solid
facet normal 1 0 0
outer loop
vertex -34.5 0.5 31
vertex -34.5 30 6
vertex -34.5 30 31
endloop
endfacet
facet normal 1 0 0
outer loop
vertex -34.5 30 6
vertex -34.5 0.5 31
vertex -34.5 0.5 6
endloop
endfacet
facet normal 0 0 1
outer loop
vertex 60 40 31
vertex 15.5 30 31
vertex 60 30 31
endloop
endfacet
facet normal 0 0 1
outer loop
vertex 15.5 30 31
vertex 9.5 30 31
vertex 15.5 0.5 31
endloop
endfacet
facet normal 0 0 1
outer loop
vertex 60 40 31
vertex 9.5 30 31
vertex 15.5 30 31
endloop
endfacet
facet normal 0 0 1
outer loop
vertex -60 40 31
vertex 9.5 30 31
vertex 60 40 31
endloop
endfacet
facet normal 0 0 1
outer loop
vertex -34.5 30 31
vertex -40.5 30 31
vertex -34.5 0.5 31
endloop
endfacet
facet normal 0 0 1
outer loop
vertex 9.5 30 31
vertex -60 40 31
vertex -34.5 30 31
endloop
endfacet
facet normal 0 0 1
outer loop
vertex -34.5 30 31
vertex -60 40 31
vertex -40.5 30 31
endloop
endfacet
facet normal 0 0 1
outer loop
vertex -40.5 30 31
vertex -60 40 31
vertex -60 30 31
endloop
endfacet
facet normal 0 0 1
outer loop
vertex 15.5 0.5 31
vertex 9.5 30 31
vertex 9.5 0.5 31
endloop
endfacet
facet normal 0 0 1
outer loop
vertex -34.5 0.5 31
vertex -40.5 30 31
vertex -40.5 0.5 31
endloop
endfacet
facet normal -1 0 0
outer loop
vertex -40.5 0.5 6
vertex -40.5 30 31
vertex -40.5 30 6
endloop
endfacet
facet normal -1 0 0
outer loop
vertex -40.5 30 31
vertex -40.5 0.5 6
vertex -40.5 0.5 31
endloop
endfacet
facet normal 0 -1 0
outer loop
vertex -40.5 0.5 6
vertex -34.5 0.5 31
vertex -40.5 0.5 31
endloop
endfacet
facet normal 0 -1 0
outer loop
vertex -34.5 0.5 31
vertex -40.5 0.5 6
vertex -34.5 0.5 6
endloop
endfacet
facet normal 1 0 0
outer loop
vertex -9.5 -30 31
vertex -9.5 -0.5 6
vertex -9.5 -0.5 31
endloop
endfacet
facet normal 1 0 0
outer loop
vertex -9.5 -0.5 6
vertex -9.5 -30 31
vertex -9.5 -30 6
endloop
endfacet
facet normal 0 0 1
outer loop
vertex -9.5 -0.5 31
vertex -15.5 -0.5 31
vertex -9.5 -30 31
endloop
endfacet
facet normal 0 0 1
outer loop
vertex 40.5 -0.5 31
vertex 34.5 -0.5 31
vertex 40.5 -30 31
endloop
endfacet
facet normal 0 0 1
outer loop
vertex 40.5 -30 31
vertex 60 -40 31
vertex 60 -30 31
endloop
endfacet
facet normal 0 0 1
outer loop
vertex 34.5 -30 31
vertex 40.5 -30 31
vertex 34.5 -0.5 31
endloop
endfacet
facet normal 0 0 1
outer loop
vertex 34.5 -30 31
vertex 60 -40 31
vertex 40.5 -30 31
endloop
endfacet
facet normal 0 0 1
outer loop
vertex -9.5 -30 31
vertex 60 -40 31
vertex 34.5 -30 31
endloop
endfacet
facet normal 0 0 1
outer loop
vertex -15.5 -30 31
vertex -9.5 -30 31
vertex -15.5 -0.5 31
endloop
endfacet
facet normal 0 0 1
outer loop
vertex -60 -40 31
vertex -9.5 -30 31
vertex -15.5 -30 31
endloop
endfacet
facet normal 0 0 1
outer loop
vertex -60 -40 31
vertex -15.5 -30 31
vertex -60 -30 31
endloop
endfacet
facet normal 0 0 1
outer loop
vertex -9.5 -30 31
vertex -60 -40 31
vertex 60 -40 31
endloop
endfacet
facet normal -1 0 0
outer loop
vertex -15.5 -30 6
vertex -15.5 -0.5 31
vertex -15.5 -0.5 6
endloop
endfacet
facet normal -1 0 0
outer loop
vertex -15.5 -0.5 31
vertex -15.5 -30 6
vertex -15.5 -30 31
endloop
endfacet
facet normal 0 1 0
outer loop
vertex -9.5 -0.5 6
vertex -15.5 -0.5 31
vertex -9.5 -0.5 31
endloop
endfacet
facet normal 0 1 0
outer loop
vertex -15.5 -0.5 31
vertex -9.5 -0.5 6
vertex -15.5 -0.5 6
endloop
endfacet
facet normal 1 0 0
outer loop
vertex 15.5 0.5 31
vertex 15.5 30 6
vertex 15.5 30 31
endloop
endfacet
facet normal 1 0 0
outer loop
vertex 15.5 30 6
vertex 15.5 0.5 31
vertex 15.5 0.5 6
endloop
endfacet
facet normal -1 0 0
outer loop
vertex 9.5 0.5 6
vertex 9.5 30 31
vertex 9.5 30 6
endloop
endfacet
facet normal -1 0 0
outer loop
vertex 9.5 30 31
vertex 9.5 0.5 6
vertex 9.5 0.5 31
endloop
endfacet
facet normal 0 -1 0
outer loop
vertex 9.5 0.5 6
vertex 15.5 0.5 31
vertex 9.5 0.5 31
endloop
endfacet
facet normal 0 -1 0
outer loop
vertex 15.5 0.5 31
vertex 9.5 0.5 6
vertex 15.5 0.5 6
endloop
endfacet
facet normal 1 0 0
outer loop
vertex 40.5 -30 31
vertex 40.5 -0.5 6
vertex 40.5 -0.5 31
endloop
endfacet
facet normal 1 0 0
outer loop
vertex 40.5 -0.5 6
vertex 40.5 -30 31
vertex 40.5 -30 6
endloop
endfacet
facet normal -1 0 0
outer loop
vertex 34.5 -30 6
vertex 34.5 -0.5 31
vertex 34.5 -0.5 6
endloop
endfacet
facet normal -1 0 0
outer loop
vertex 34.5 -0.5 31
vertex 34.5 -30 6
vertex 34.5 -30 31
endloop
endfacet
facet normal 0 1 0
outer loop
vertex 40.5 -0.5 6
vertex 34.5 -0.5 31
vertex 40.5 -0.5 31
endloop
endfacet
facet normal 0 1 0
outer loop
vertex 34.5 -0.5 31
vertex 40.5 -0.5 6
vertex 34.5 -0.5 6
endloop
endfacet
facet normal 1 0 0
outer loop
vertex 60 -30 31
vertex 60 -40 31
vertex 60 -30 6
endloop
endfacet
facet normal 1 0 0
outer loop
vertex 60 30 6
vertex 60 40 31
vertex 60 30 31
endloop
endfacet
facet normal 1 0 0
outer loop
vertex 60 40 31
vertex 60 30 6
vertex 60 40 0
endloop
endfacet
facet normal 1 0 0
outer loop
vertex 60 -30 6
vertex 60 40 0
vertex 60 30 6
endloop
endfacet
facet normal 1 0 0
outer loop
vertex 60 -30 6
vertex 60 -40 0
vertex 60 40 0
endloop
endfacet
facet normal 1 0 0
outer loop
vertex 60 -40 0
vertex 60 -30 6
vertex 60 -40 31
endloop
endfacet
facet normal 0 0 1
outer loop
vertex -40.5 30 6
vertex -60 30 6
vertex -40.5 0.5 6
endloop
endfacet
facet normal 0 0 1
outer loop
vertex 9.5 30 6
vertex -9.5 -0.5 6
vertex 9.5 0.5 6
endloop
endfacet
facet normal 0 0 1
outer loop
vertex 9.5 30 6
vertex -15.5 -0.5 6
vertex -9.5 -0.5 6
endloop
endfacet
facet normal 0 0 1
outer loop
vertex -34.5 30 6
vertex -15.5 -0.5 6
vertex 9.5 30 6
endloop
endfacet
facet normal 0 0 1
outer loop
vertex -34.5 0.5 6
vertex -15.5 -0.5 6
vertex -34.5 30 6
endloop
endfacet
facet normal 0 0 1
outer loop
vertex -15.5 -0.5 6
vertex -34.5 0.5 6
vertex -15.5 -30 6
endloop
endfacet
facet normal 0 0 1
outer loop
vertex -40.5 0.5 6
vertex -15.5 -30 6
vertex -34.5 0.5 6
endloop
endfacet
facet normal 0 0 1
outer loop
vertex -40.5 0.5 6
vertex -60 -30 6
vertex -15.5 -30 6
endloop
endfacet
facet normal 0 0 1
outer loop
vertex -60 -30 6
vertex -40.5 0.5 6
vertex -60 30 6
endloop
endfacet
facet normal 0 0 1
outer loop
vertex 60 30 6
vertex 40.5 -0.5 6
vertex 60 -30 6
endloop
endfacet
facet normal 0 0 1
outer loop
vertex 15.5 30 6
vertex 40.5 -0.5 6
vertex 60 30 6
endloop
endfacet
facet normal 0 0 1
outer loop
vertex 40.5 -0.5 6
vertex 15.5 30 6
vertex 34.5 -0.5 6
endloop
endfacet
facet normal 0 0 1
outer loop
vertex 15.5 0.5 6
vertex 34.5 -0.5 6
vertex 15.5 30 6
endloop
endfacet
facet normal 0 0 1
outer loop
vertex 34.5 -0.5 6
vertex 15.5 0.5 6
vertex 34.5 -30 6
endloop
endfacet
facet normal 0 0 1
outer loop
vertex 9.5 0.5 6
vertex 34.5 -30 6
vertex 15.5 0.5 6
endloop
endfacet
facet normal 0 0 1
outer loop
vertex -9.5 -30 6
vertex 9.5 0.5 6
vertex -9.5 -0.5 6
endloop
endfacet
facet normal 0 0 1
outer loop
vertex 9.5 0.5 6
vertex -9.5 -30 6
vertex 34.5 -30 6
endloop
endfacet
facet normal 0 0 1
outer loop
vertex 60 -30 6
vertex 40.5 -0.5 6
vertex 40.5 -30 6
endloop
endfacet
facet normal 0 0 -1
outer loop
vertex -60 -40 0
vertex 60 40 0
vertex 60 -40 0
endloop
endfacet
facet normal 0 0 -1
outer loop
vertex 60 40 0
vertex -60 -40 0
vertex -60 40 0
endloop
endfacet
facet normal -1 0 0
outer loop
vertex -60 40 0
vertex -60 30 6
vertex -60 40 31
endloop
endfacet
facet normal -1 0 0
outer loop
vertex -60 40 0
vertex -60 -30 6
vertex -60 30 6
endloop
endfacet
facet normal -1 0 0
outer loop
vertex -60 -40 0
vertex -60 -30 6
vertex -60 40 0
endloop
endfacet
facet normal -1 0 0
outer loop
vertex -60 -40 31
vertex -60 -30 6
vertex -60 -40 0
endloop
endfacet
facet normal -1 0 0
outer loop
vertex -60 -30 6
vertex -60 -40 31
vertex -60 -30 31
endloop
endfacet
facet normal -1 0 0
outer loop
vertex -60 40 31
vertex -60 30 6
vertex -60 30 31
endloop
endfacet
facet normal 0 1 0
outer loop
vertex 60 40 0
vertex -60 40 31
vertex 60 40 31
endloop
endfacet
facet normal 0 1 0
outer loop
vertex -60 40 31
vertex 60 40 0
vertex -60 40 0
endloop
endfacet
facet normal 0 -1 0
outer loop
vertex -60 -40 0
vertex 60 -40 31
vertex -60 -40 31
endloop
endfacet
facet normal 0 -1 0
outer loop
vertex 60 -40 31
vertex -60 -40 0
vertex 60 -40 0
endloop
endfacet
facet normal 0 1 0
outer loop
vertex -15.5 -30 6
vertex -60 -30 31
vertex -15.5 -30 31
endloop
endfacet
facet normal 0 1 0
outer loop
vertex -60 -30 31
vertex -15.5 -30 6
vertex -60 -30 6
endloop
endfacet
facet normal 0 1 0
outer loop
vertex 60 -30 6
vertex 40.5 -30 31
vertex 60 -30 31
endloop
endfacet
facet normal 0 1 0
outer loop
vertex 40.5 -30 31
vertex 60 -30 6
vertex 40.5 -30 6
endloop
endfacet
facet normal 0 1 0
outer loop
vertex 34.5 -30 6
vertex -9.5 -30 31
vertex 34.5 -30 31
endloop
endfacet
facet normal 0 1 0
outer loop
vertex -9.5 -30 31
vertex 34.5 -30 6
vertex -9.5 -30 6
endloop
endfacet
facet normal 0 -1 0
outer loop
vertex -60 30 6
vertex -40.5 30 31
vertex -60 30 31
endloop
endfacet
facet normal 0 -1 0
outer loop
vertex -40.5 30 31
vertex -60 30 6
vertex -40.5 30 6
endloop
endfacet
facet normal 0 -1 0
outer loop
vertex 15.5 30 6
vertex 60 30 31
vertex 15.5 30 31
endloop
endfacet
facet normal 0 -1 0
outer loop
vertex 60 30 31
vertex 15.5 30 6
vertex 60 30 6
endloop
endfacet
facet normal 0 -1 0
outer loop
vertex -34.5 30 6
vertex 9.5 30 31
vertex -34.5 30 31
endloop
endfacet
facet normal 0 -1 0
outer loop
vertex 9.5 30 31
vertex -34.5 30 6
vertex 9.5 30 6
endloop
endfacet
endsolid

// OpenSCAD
$fn = 32;

// ----------------------------------------------------------------------
// Rib frame 120 x 80 x 31
// 4 ribs at 25 mm pitch, staggered
// ----------------------------------------------------------------------

// --- parameters (mm) ---
frame = [120, 80, 6];  // base plate size (x, y, z)
rail_w = 10;           // side rail width
ribs = 4;              // number of ribs
rib_t = 6;             // rib thickness
rib_h = 25;            // rib height above the base plate
pitch = 25;            // pitch between rib centres

// --- derived feature positions (mm) ---
span = (ribs - 1) * pitch;          // = 75   distance between the outer ribs
origin_x = -span / 2;               // = -37.5   X of the first rib
rib_len = frame[1] / 2 - rail_w + 0.5;  // = 30.5   length of a staggered rib
rib_y = 0.5 + rib_len / 2;          // = 15.75   Y of a staggered rib centre
row_offset = 2 * rib_y;             // = 31.5   distance between the two rows
feature_centers = [
  [origin_x + 0 * pitch, rib_y],
  [origin_x + 1 * pitch, -rib_y],
  [origin_x + 2 * pitch, rib_y],
  [origin_x + 3 * pitch, -rib_y]
];   // rib centre line, drives the rib loop

// base plate, two side rails, then the ribs read straight off feature_centers
union() {
  translate([-frame[0] / 2, -frame[1] / 2, 0]) cube(frame);
  translate([-frame[0] / 2, -frame[1] / 2, 0]) cube([frame[0], rail_w, frame[2] + rib_h]);
  translate([-frame[0] / 2, frame[1] / 2 - rail_w, 0]) cube([frame[0], rail_w, frame[2] + rib_h]);
  for (centre = feature_centers)
    translate([centre[0] - rib_t / 2, centre[1] - rib_len / 2, frame[2] - 1])
      cube([rib_t, rib_len, rib_h + 1]);
}
